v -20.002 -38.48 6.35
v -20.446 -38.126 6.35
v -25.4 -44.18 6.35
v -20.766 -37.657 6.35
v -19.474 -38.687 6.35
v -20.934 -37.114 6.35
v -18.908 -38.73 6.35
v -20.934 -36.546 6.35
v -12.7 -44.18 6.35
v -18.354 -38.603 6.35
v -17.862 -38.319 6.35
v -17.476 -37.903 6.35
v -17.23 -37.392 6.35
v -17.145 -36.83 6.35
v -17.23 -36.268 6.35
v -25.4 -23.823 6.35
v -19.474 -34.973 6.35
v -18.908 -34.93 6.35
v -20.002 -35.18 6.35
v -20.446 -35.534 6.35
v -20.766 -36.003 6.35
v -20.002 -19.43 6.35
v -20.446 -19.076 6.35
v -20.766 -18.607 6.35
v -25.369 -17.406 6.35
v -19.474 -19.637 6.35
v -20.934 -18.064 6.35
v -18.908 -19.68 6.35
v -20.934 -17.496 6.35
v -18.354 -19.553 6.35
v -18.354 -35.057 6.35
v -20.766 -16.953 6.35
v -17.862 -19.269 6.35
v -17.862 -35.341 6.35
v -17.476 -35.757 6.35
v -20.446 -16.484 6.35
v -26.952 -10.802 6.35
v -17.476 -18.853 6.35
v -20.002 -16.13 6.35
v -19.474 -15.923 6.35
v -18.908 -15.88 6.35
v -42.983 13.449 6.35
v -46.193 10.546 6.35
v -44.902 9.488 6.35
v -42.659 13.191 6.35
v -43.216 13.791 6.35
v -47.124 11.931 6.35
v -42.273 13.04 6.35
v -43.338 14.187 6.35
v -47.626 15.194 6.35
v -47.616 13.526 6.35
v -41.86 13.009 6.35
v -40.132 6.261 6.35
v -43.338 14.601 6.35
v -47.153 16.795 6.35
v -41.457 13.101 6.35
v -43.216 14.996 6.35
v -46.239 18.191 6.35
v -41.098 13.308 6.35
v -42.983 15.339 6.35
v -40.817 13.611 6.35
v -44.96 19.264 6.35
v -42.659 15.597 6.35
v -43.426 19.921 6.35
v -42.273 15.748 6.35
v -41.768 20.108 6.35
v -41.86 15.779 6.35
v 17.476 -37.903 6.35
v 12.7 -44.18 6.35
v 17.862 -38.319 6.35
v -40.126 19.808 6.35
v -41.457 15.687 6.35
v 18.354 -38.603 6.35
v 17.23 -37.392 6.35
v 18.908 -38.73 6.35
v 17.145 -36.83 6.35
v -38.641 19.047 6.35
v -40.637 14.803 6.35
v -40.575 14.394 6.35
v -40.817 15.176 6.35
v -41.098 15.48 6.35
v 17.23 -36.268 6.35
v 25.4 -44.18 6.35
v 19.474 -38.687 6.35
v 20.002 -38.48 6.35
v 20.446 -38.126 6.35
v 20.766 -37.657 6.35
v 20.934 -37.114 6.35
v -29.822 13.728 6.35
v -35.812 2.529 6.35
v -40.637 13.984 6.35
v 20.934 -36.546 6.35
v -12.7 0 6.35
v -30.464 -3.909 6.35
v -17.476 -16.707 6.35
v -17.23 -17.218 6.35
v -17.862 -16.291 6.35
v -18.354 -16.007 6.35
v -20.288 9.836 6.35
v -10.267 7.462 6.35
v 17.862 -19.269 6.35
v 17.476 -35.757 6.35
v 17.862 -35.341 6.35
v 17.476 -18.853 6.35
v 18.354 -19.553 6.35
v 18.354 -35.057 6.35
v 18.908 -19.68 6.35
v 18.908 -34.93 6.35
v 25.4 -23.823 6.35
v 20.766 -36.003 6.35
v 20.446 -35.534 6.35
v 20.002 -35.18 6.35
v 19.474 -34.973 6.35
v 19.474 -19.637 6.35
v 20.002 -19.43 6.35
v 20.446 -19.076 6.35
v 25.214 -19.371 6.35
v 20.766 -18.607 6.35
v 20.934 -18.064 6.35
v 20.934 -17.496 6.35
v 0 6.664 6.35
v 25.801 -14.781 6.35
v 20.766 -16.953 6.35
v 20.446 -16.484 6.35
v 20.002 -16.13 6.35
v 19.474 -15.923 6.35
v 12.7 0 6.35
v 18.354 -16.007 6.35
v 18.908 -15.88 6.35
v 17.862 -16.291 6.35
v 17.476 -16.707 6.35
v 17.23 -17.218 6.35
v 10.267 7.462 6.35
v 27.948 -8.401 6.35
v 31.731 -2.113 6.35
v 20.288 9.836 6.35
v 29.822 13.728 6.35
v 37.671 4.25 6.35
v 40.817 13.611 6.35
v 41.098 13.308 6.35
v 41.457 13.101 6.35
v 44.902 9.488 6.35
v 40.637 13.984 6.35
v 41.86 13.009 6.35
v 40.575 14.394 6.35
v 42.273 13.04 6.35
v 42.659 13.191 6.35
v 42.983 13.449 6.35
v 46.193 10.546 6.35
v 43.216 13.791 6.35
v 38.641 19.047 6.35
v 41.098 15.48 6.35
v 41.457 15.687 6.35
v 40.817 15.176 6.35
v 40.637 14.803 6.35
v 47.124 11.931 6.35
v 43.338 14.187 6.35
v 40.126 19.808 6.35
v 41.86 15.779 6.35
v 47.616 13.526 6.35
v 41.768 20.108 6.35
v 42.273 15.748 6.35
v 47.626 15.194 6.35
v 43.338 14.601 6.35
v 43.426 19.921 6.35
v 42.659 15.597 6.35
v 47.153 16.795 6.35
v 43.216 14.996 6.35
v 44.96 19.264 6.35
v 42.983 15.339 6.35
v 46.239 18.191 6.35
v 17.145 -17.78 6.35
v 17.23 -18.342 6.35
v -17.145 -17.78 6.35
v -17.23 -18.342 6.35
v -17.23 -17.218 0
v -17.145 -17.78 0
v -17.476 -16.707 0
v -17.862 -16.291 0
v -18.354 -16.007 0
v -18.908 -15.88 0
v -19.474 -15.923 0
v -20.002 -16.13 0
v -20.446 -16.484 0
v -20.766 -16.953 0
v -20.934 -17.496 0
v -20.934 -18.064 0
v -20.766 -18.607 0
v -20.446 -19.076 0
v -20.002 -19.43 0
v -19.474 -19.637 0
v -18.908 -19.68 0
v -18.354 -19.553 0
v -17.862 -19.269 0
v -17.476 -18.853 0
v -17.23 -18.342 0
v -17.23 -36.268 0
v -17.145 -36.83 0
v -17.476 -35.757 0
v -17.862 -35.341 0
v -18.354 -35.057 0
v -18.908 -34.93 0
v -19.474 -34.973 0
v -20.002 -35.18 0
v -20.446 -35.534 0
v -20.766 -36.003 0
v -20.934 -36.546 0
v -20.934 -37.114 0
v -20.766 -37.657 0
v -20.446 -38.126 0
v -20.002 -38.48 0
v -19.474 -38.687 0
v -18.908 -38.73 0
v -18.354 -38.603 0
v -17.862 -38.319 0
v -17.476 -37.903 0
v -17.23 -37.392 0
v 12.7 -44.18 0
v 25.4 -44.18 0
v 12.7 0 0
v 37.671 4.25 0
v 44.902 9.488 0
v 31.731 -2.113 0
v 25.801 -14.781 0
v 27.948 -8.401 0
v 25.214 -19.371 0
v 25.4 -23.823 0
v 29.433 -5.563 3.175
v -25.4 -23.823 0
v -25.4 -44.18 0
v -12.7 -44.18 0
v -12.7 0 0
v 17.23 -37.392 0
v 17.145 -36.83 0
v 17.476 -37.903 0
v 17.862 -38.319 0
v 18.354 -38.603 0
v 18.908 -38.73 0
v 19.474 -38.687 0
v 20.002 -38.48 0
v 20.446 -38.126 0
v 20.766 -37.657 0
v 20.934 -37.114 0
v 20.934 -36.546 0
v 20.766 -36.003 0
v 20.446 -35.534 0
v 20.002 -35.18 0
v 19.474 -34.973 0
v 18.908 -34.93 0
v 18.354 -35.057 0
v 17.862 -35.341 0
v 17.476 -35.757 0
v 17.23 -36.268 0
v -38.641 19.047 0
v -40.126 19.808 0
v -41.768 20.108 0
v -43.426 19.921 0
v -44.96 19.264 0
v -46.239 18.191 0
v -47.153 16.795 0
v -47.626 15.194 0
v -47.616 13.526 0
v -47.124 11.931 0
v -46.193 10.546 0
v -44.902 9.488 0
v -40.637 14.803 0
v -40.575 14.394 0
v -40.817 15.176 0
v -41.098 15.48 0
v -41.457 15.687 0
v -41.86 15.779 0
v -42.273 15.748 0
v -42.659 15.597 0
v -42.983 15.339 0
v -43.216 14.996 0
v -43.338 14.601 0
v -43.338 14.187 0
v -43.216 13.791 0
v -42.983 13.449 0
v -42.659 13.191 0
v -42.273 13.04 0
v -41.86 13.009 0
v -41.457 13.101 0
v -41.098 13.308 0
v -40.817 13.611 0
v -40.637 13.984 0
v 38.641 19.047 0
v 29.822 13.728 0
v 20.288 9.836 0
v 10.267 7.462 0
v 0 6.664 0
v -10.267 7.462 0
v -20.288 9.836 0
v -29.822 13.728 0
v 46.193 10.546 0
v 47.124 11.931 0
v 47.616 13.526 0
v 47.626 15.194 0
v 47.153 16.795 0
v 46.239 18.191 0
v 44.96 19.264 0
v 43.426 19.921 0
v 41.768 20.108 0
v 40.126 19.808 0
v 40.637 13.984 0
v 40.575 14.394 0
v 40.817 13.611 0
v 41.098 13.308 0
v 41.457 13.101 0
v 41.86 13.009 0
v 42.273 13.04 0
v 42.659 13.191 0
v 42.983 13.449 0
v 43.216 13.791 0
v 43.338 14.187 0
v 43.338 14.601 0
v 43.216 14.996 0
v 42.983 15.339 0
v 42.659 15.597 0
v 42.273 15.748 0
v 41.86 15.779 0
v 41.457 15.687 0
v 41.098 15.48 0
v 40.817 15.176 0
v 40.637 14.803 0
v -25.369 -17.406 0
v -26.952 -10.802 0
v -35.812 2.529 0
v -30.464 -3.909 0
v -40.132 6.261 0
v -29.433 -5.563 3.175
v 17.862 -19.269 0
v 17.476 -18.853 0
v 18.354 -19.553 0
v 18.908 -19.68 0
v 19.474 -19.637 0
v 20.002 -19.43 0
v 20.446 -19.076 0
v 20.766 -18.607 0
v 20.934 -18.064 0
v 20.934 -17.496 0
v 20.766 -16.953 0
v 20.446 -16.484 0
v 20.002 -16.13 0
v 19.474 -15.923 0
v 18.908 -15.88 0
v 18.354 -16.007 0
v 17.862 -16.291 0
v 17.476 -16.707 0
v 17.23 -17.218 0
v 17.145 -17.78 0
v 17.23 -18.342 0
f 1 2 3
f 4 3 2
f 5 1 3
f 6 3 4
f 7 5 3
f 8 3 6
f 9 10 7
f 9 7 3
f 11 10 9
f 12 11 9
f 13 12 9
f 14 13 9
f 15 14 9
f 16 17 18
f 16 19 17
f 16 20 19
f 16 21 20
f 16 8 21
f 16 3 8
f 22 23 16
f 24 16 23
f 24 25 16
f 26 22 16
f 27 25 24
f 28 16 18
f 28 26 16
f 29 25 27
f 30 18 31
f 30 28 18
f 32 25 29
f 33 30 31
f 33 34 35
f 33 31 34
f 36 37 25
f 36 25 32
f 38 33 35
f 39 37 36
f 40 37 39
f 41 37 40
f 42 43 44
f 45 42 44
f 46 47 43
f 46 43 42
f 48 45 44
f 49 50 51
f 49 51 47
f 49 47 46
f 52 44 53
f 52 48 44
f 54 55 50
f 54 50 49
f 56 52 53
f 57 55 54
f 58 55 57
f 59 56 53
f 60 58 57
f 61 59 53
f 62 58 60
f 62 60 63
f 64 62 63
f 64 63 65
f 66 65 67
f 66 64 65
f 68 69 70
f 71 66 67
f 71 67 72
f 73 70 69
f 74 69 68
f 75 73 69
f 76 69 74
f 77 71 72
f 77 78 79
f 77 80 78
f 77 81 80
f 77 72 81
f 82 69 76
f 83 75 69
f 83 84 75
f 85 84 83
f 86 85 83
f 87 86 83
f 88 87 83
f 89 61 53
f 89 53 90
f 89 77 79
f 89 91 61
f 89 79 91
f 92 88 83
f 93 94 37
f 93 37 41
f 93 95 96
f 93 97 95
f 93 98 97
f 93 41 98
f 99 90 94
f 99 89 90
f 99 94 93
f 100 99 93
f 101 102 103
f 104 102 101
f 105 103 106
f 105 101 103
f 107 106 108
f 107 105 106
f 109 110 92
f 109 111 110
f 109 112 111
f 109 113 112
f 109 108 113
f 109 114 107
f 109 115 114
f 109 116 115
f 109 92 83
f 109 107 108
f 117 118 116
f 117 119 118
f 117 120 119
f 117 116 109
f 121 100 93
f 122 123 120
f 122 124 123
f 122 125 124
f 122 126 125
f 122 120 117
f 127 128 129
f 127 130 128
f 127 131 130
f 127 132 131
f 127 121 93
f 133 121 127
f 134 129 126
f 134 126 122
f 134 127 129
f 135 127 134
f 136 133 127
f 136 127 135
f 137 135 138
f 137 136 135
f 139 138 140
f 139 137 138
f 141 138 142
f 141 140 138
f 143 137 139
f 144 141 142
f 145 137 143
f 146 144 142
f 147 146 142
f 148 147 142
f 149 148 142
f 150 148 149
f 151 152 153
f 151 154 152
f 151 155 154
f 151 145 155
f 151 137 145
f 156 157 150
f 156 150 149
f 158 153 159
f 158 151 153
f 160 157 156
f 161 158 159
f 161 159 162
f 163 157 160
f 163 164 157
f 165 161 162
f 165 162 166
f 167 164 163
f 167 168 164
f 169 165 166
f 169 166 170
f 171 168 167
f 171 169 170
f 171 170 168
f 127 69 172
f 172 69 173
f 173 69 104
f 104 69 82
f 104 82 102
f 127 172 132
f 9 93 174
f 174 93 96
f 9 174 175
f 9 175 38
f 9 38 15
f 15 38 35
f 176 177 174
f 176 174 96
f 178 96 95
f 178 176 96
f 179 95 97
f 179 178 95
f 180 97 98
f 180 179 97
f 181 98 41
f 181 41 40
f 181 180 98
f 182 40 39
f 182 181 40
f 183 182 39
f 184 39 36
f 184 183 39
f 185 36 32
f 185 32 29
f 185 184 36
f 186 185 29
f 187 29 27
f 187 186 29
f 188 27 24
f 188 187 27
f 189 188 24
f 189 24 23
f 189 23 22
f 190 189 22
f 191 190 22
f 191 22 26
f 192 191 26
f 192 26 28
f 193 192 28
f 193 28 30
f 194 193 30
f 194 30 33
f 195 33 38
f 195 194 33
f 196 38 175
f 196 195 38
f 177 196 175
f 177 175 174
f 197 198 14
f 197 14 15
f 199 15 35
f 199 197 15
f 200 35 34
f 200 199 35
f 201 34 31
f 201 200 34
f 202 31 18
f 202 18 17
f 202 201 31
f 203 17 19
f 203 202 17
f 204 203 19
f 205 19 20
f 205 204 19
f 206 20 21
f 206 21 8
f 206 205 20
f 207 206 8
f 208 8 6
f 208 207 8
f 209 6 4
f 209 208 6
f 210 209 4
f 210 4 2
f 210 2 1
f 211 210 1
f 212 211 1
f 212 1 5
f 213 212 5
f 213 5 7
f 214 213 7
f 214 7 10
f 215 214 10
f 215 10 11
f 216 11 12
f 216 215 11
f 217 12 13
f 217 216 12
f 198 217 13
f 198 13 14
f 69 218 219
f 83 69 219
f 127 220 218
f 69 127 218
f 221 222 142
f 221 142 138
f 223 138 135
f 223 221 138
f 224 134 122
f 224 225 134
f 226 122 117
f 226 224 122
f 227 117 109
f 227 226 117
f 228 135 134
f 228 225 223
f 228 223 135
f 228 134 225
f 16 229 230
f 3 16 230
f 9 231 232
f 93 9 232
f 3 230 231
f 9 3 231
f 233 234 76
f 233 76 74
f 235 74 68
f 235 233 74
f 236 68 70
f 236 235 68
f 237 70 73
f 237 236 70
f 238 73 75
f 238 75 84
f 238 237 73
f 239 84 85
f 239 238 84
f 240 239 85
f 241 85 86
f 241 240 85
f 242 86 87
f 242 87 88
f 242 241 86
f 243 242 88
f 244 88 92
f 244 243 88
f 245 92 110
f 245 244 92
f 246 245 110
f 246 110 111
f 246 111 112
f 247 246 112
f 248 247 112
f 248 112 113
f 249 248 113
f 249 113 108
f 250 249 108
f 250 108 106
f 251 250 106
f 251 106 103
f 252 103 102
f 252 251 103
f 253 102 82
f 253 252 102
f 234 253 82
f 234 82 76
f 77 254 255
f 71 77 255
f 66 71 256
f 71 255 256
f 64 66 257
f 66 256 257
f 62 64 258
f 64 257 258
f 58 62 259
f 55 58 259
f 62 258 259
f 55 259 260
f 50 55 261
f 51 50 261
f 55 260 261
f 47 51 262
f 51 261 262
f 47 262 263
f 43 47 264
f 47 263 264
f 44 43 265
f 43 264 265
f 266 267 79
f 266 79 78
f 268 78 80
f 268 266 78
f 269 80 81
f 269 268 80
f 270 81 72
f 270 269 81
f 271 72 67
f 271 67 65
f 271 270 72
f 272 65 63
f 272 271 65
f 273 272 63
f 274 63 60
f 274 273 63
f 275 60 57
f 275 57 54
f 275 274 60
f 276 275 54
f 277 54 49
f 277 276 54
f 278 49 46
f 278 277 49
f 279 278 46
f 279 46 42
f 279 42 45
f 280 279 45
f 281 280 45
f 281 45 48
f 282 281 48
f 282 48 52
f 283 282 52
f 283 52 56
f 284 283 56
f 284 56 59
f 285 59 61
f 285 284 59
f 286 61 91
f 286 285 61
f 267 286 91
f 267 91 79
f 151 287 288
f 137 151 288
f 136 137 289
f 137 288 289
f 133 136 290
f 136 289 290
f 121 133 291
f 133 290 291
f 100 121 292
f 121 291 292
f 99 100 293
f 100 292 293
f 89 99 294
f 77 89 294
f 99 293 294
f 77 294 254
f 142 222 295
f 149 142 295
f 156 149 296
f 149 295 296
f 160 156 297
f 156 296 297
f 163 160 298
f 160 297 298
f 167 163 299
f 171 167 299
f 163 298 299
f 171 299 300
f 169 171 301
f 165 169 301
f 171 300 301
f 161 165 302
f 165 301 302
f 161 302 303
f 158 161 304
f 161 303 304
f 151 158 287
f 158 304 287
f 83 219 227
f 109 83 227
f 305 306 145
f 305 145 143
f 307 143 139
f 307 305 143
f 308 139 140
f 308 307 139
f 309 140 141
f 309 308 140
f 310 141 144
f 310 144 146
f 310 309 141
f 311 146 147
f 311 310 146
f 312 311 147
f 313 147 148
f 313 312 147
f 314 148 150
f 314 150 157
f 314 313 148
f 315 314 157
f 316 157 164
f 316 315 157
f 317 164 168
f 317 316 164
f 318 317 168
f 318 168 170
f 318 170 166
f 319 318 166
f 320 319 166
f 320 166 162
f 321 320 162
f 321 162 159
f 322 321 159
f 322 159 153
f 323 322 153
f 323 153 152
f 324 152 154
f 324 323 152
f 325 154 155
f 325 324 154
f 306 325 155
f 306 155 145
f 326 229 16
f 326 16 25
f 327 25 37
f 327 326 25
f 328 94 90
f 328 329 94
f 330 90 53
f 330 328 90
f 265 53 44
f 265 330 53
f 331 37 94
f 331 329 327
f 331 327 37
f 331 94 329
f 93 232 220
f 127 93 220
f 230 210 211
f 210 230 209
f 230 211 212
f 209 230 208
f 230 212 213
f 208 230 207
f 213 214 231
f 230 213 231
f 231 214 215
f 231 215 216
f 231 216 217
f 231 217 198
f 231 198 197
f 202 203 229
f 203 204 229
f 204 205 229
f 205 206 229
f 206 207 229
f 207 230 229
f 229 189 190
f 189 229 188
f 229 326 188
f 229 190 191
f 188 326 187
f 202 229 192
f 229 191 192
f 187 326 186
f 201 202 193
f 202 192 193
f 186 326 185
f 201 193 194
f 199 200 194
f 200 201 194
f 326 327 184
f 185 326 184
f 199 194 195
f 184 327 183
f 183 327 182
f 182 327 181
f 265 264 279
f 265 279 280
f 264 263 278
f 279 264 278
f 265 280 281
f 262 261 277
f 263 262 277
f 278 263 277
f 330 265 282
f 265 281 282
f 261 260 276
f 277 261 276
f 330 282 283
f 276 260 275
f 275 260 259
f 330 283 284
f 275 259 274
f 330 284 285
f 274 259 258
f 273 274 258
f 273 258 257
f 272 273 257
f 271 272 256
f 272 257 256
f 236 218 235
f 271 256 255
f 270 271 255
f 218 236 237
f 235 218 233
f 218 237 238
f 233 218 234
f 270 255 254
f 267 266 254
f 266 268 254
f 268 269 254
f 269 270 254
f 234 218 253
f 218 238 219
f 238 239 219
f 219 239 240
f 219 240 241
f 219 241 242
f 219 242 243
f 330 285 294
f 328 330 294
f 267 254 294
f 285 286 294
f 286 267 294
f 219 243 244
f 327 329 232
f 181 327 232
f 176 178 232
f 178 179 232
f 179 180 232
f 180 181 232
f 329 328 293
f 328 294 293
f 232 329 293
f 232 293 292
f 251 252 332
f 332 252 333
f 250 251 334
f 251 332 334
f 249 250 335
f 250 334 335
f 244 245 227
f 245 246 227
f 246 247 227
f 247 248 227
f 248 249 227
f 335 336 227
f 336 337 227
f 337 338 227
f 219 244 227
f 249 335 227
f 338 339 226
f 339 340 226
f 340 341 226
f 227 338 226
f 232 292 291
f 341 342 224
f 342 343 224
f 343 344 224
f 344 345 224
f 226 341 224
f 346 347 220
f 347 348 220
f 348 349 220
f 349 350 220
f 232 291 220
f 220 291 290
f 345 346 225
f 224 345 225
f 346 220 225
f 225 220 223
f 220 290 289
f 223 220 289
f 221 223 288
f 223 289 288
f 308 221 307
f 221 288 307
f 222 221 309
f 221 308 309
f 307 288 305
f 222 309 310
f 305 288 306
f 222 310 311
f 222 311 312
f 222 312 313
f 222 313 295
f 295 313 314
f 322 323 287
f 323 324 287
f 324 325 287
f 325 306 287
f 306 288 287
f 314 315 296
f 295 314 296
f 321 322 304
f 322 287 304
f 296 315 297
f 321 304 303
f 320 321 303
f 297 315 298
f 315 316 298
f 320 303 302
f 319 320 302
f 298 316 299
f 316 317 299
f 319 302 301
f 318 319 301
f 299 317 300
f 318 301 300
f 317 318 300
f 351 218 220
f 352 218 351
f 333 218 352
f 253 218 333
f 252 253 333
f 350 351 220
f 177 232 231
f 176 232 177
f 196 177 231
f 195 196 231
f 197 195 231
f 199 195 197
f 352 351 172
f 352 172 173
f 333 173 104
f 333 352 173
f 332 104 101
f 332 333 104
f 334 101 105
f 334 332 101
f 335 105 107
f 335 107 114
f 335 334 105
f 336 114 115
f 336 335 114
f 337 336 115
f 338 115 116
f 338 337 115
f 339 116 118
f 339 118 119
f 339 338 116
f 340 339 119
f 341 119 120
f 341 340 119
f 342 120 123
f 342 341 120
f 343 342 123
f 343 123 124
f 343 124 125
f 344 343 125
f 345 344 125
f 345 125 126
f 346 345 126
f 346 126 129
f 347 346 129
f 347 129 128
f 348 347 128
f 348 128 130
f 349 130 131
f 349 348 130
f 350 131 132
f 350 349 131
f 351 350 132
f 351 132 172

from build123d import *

# Parameters (mm, degrees)
SKETCH1_R           = 1.3890625
SKETCH1_R_2         = 1.905
BOSS_EXTRUDE1_DEPTH = 6.35


with BuildPart() as part:
    # Sketch1 → Boss-Extrude1 (new body)
    with BuildSketch(Plane.XY):
        with BuildLine():
            Line((-12.7, 0), (12.7, 0))
            Line((12.7, 0), (12.7, -44.17993629))
            Line((12.7, -44.17993629), (25.4, -44.17993629))
            Line((25.4, -44.17993629), (25.4, -23.822954819))
            add(Edge.make_bspline(
                [(44.901870562, 9.48833089), (22.852171125, -3.715928222), (25.4, -23.822954819)],
                knots=[5.247063621, 5.247063621, 5.247063621, 6.283185307, 6.283185307, 6.283185307], degree=2, weights=[1, 0.868781076, 1]))
            ThreePointArc((44.901870562, 9.48833089), (46.747333824, 17.526669162), (38.641141335, 19.046623163))
            ThreePointArc((38.641141335, 19.046623163), (0, 6.664444687), (-38.641141335, 19.046623163))
            ThreePointArc((-38.641141335, 19.046623163), (-46.747333824, 17.526669162), (-44.901870562, 9.48833089))
            add(Edge.make_bspline(
                [(-25.4, -23.822954819), (-22.852171125, -3.715928222), (-44.901870562, 9.48833089)],
                knots=[0, 0, 0, 1.036121686, 1.036121686, 1.036121686], degree=2, weights=[1, 0.868781076, 1]))
            Line((-25.4, -23.822954819), (-25.4, -44.17993629))
            Line((-25.4, -44.17993629), (-12.7, -44.17993629))
            Line((-12.7, -44.17993629), (-12.7, 0))
        make_face()
        with Locations(Location((41.964300524, 14.393758438, 0), (0, 0, 180))):
            Circle(SKETCH1_R, mode=Mode.SUBTRACT)
        with Locations((-41.964300524, 14.393758438)):
            Circle(SKETCH1_R, mode=Mode.SUBTRACT)
        with Locations((-19.05, -17.78)):
            Circle(SKETCH1_R_2, mode=Mode.SUBTRACT)
        with Locations((-19.05, -36.83)):
            Circle(SKETCH1_R_2, mode=Mode.SUBTRACT)
        with Locations(Location((19.05, -36.83, 0), (0, 0, 180))):
            Circle(SKETCH1_R_2, mode=Mode.SUBTRACT)
        with Locations(Location((19.05, -17.78, 0), (0, 0, 180))):
            Circle(SKETCH1_R_2, mode=Mode.SUBTRACT)
    extrude(amount=BOSS_EXTRUDE1_DEPTH)


solid = part.part
